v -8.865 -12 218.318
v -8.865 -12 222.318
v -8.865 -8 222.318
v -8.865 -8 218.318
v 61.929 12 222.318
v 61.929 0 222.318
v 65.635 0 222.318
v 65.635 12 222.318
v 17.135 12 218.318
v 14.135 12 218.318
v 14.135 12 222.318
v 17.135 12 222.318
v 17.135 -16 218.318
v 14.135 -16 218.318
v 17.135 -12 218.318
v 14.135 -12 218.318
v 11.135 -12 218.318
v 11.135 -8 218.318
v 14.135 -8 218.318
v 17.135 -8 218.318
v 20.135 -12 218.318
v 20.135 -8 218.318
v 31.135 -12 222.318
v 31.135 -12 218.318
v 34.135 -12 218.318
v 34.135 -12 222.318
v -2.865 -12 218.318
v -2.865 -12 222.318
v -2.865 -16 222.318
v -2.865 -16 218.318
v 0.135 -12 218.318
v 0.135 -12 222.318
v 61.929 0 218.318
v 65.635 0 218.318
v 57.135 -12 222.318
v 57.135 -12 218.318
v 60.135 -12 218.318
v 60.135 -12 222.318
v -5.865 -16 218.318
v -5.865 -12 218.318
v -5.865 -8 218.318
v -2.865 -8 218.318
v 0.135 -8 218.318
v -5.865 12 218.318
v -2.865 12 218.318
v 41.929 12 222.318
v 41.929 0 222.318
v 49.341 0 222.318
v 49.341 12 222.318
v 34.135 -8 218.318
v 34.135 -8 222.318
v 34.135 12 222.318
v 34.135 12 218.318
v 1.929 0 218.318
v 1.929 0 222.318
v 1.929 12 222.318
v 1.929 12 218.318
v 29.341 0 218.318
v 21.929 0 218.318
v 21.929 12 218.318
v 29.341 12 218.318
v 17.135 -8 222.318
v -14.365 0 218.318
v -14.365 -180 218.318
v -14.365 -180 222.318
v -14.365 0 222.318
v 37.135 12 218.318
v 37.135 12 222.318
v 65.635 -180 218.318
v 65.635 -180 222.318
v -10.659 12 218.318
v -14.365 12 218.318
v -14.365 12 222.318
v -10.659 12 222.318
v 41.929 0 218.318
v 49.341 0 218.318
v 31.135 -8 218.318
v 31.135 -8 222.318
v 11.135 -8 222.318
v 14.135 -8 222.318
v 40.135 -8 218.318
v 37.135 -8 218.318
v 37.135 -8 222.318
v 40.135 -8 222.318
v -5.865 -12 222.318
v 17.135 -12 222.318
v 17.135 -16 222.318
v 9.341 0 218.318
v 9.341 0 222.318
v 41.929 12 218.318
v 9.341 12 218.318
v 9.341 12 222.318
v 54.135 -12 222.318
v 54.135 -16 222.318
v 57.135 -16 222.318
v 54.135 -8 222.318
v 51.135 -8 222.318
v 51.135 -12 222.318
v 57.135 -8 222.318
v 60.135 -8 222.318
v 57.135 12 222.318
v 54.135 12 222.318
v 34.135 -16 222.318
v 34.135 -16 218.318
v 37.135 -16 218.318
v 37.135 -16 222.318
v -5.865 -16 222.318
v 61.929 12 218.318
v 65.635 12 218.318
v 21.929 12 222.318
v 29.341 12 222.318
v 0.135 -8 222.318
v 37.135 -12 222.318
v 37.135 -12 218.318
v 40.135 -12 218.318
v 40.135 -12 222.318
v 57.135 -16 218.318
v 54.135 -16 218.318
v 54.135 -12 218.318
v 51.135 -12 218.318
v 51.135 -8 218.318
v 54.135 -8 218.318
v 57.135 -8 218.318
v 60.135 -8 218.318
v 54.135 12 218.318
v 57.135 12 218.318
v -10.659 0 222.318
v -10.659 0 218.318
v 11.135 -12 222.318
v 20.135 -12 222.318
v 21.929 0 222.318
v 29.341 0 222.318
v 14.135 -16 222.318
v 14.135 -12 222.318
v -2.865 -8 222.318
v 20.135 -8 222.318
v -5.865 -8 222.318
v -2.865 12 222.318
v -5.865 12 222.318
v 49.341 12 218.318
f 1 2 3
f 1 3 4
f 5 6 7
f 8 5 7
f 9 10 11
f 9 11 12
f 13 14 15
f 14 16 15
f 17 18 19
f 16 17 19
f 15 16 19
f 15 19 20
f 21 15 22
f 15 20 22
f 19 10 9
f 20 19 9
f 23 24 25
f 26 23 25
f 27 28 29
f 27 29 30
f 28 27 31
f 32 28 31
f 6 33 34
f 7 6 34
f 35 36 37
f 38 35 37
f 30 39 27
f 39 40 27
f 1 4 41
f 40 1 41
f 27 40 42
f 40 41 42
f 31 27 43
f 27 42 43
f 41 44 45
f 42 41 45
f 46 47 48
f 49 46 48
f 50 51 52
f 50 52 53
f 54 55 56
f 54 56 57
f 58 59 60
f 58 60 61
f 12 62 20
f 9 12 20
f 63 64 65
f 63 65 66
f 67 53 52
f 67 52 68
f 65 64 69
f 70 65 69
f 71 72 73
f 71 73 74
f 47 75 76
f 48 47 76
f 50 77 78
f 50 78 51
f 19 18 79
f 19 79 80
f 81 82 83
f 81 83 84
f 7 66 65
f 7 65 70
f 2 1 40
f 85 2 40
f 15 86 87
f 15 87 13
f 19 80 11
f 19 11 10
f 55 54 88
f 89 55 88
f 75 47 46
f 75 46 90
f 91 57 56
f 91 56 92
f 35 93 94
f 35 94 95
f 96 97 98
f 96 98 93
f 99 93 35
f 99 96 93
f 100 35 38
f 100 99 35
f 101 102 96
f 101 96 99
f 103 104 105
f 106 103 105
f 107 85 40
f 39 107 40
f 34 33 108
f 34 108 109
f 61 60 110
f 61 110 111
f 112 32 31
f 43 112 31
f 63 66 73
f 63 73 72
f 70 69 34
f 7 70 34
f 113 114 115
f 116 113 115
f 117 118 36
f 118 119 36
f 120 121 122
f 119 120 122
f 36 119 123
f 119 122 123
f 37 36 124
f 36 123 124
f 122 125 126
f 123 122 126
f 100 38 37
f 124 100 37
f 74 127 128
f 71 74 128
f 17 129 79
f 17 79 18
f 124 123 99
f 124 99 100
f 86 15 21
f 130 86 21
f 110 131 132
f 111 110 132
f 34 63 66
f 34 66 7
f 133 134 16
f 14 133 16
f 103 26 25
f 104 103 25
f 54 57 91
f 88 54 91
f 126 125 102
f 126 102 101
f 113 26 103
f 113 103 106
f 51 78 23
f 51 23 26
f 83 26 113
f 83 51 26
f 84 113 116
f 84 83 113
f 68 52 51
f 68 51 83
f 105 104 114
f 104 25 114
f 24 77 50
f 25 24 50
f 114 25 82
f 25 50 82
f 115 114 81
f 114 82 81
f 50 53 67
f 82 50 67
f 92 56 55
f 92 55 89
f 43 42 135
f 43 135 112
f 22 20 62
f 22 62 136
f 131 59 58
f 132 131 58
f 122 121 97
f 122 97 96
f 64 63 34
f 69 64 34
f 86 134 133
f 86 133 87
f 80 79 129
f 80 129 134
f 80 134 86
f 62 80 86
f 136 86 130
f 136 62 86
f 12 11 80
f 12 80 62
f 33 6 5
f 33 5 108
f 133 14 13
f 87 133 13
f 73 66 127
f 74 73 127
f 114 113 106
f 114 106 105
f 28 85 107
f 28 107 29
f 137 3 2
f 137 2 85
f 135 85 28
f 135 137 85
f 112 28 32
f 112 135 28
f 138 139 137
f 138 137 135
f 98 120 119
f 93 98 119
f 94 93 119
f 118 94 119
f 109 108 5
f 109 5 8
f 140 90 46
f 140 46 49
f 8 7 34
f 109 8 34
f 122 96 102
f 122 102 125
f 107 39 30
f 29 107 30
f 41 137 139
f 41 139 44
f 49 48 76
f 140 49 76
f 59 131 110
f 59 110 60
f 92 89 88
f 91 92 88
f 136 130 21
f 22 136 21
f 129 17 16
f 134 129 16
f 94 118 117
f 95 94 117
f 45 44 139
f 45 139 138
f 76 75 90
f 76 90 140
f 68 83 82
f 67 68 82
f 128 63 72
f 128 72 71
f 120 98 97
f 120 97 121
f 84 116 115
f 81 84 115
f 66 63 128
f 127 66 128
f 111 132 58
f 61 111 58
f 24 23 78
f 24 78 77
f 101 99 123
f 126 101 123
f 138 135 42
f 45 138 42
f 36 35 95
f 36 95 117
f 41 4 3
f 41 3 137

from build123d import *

# Parameters (mm, degrees)
SKETCH3_W             = 3.705882353
SKETCH3_H             = 4
BOSS_EXTRUDE2_DEPTH   = 12
SKETCH3_W_2           = 3
BOSS_EXTRUDE2_2_DEPTH = 12
SKETCH3_W_3           = 7.411764706
BOSS_EXTRUDE2_3_DEPTH = 12
BOSS_EXTRUDE2_4_DEPTH = 12
BOSS_EXTRUDE2_5_DEPTH = 12
BOSS_EXTRUDE2_6_DEPTH = 12
BOSS_EXTRUDE2_7_DEPTH = 12
BOSS_EXTRUDE2_8_DEPTH = 12
BOSS_EXTRUDE2_9_DEPTH = 12
SKETCH3_6_W           = 3
SKETCH3_6_H           = 4
BOSS_EXTRUDE4_DEPTH   = 16
BOSS_EXTRUDE5_START   = -12
SKETCH3_7_W           = 3
SKETCH3_7_H           = 4
BOSS_EXTRUDE5_DEPTH   = 4
SKETCH4_W             = 80
SKETCH4_H             = 180
BOSS_EXTRUDE6_DEPTH   = 4


with BuildPart() as part:
    # Sketch3 → Boss-Extrude2 (new body)
    with BuildSketch(Plane(origin=(0, 0, 0), x_dir=(1, 0, 0), z_dir=(0, 1, 0))):
        with Locations((-12.511786974, -220.31766228)):
            Rectangle(SKETCH3_W, SKETCH3_H)
    extrude(amount=BOSS_EXTRUDE2_DEPTH)


with BuildPart() as body_2:
    # Sketch3 → Boss-Extrude2 2 (new body)
    with BuildSketch(Plane(origin=(0, 0, 0), x_dir=(1, 0, 0), z_dir=(0, 1, 0))):
        with Locations((-4.36472815, -220.31766228)):
            Rectangle(SKETCH3_W_2, SKETCH3_H)
    extrude(amount=BOSS_EXTRUDE2_2_DEPTH)



with BuildPart() as body_3:
    # Sketch3 → Boss-Extrude2 3 (new body)
    with BuildSketch(Plane(origin=(0, 0, 0), x_dir=(1, 0, 0), z_dir=(0, 1, 0))):
        with Locations((5.63527185, -220.31766228)):
            Rectangle(SKETCH3_W_3, SKETCH3_H)
    extrude(amount=BOSS_EXTRUDE2_3_DEPTH)


with BuildPart() as body_4:
    # Sketch3 → Boss-Extrude2 4 (new body)
    with BuildSketch(Plane(origin=(0, 0, 0), x_dir=(1, 0, 0), z_dir=(0, 1, 0))):
        with Locations((15.63527185, -220.31766228)):
            Rectangle(SKETCH3_W_2, SKETCH3_H)
    extrude(amount=BOSS_EXTRUDE2_4_DEPTH)


with BuildPart() as body_5:
    # Sketch3 → Boss-Extrude2 5 (new body)
    with BuildSketch(Plane(origin=(0, 0, 0), x_dir=(1, 0, 0), z_dir=(0, 1, 0))):
        with Locations((25.63527185, -220.31766228)):
            Rectangle(SKETCH3_W_3, SKETCH3_H)
    extrude(amount=BOSS_EXTRUDE2_5_DEPTH)


with BuildPart() as body_6:
    # Sketch3 → Boss-Extrude2 6 (new body)
    with BuildSketch(Plane(origin=(0, 0, 0), x_dir=(1, 0, 0), z_dir=(0, 1, 0))):
        with Locations((35.63527185, -220.31766228)):
            Rectangle(SKETCH3_W_2, SKETCH3_H)
    extrude(amount=BOSS_EXTRUDE2_6_DEPTH)


with BuildPart() as body_7:
    # Sketch3 → Boss-Extrude2 7 (new body)
    with BuildSketch(Plane(origin=(0, 0, 0), x_dir=(1, 0, 0), z_dir=(0, 1, 0))):
        with Locations((45.63527185, -220.31766228)):
            Rectangle(SKETCH3_W_3, SKETCH3_H)
    extrude(amount=BOSS_EXTRUDE2_7_DEPTH)


with BuildPart() as body_8:
    # Sketch3 → Boss-Extrude2 8 (new body)
    with BuildSketch(Plane(origin=(0, 0, 0), x_dir=(1, 0, 0), z_dir=(0, 1, 0))):
        with Locations((55.63527185, -220.31766228)):
            Rectangle(SKETCH3_W_2, SKETCH3_H)
    extrude(amount=BOSS_EXTRUDE2_8_DEPTH)


with BuildPart() as body_9:
    # Sketch3 → Boss-Extrude2 9 (new body)
    with BuildSketch(Plane(origin=(0, 0, 0), x_dir=(1, 0, 0), z_dir=(0, 1, 0))):
        with Locations((63.782330674, -220.31766228)):
            Rectangle(SKETCH3_W, SKETCH3_H)
    extrude(amount=BOSS_EXTRUDE2_9_DEPTH)


with BuildPart() as body_2_1:
    add(body_2.part)

    add(body_4.part)  # Boss-Extrude4 merges body 4

    add(body_6.part)  # Boss-Extrude4 merges body 6

    add(body_8.part)  # Boss-Extrude4 merges body 8
    # Sketch3<6> → Boss-Extrude4 (add)
    with BuildSketch(Plane(origin=(0, 0, 0), x_dir=(1, 0, 0), z_dir=(0, 1, 0))):
        with Locations((-4.36472815, -220.31766228)):
            Rectangle(SKETCH3_6_W, SKETCH3_6_H)
        with Locations((15.63527185, -220.31766228)):
            Rectangle(SKETCH3_6_W, SKETCH3_6_H)
        with Locations((35.63527185, -220.31766228)):
            Rectangle(SKETCH3_6_W, SKETCH3_6_H)
        with Locations((55.63527185, -220.31766228)):
            Rectangle(SKETCH3_6_W, SKETCH3_6_H)
    extrude(amount=-BOSS_EXTRUDE4_DEPTH)

    # Sketch3<7> → Boss-Extrude5 (add)
    with BuildSketch(Plane(origin=(0, 0, 0), x_dir=(1, 0, 0), z_dir=(0, 1, 0)).offset(BOSS_EXTRUDE5_START)):
        with Locations((-7.36472815, -220.31766228)):
            Rectangle(SKETCH3_7_W, SKETCH3_7_H)
        with Locations((-1.36472815, -220.31766228)):
            Rectangle(SKETCH3_7_W, SKETCH3_7_H)
        with Locations((12.63527185, -220.31766228)):
            Rectangle(SKETCH3_7_W, SKETCH3_7_H)
        with Locations((18.63527185, -220.31766228)):
            Rectangle(SKETCH3_7_W, SKETCH3_7_H)
        with Locations((32.63527185, -220.31766228)):
            Rectangle(SKETCH3_7_W, SKETCH3_7_H)
        with Locations((38.63527185, -220.31766228)):
            Rectangle(SKETCH3_7_W, SKETCH3_7_H)
        with Locations((52.63527185, -220.31766228)):
            Rectangle(SKETCH3_7_W, SKETCH3_7_H)
        with Locations((58.63527185, -220.31766228)):
            Rectangle(SKETCH3_7_W, SKETCH3_7_H)
    extrude(amount=BOSS_EXTRUDE5_DEPTH)


with BuildPart() as body_7_2:
    # Sketch4 → Boss-Extrude6 (new body)
    with BuildSketch(Plane.XY):
        with Locations((10.2897637, -144.973534825)):
            Rectangle(SKETCH4_W, SKETCH4_H)
    extrude(amount=BOSS_EXTRUDE6_DEPTH)


with BuildPart() as body_7_2_1:
    # Body-Move/Copy1: read off the stored shape, not the designer's step
    # Body-Move/Copy1: moved
    add(body_7_2.part.moved(Location((15.3455082, 54.9735348, 218.3176623))))


solid = Compound([part.part, body_3.part, body_5.part, body_7.part, body_9.part, body_2_1.part, body_7_2_1.part])
